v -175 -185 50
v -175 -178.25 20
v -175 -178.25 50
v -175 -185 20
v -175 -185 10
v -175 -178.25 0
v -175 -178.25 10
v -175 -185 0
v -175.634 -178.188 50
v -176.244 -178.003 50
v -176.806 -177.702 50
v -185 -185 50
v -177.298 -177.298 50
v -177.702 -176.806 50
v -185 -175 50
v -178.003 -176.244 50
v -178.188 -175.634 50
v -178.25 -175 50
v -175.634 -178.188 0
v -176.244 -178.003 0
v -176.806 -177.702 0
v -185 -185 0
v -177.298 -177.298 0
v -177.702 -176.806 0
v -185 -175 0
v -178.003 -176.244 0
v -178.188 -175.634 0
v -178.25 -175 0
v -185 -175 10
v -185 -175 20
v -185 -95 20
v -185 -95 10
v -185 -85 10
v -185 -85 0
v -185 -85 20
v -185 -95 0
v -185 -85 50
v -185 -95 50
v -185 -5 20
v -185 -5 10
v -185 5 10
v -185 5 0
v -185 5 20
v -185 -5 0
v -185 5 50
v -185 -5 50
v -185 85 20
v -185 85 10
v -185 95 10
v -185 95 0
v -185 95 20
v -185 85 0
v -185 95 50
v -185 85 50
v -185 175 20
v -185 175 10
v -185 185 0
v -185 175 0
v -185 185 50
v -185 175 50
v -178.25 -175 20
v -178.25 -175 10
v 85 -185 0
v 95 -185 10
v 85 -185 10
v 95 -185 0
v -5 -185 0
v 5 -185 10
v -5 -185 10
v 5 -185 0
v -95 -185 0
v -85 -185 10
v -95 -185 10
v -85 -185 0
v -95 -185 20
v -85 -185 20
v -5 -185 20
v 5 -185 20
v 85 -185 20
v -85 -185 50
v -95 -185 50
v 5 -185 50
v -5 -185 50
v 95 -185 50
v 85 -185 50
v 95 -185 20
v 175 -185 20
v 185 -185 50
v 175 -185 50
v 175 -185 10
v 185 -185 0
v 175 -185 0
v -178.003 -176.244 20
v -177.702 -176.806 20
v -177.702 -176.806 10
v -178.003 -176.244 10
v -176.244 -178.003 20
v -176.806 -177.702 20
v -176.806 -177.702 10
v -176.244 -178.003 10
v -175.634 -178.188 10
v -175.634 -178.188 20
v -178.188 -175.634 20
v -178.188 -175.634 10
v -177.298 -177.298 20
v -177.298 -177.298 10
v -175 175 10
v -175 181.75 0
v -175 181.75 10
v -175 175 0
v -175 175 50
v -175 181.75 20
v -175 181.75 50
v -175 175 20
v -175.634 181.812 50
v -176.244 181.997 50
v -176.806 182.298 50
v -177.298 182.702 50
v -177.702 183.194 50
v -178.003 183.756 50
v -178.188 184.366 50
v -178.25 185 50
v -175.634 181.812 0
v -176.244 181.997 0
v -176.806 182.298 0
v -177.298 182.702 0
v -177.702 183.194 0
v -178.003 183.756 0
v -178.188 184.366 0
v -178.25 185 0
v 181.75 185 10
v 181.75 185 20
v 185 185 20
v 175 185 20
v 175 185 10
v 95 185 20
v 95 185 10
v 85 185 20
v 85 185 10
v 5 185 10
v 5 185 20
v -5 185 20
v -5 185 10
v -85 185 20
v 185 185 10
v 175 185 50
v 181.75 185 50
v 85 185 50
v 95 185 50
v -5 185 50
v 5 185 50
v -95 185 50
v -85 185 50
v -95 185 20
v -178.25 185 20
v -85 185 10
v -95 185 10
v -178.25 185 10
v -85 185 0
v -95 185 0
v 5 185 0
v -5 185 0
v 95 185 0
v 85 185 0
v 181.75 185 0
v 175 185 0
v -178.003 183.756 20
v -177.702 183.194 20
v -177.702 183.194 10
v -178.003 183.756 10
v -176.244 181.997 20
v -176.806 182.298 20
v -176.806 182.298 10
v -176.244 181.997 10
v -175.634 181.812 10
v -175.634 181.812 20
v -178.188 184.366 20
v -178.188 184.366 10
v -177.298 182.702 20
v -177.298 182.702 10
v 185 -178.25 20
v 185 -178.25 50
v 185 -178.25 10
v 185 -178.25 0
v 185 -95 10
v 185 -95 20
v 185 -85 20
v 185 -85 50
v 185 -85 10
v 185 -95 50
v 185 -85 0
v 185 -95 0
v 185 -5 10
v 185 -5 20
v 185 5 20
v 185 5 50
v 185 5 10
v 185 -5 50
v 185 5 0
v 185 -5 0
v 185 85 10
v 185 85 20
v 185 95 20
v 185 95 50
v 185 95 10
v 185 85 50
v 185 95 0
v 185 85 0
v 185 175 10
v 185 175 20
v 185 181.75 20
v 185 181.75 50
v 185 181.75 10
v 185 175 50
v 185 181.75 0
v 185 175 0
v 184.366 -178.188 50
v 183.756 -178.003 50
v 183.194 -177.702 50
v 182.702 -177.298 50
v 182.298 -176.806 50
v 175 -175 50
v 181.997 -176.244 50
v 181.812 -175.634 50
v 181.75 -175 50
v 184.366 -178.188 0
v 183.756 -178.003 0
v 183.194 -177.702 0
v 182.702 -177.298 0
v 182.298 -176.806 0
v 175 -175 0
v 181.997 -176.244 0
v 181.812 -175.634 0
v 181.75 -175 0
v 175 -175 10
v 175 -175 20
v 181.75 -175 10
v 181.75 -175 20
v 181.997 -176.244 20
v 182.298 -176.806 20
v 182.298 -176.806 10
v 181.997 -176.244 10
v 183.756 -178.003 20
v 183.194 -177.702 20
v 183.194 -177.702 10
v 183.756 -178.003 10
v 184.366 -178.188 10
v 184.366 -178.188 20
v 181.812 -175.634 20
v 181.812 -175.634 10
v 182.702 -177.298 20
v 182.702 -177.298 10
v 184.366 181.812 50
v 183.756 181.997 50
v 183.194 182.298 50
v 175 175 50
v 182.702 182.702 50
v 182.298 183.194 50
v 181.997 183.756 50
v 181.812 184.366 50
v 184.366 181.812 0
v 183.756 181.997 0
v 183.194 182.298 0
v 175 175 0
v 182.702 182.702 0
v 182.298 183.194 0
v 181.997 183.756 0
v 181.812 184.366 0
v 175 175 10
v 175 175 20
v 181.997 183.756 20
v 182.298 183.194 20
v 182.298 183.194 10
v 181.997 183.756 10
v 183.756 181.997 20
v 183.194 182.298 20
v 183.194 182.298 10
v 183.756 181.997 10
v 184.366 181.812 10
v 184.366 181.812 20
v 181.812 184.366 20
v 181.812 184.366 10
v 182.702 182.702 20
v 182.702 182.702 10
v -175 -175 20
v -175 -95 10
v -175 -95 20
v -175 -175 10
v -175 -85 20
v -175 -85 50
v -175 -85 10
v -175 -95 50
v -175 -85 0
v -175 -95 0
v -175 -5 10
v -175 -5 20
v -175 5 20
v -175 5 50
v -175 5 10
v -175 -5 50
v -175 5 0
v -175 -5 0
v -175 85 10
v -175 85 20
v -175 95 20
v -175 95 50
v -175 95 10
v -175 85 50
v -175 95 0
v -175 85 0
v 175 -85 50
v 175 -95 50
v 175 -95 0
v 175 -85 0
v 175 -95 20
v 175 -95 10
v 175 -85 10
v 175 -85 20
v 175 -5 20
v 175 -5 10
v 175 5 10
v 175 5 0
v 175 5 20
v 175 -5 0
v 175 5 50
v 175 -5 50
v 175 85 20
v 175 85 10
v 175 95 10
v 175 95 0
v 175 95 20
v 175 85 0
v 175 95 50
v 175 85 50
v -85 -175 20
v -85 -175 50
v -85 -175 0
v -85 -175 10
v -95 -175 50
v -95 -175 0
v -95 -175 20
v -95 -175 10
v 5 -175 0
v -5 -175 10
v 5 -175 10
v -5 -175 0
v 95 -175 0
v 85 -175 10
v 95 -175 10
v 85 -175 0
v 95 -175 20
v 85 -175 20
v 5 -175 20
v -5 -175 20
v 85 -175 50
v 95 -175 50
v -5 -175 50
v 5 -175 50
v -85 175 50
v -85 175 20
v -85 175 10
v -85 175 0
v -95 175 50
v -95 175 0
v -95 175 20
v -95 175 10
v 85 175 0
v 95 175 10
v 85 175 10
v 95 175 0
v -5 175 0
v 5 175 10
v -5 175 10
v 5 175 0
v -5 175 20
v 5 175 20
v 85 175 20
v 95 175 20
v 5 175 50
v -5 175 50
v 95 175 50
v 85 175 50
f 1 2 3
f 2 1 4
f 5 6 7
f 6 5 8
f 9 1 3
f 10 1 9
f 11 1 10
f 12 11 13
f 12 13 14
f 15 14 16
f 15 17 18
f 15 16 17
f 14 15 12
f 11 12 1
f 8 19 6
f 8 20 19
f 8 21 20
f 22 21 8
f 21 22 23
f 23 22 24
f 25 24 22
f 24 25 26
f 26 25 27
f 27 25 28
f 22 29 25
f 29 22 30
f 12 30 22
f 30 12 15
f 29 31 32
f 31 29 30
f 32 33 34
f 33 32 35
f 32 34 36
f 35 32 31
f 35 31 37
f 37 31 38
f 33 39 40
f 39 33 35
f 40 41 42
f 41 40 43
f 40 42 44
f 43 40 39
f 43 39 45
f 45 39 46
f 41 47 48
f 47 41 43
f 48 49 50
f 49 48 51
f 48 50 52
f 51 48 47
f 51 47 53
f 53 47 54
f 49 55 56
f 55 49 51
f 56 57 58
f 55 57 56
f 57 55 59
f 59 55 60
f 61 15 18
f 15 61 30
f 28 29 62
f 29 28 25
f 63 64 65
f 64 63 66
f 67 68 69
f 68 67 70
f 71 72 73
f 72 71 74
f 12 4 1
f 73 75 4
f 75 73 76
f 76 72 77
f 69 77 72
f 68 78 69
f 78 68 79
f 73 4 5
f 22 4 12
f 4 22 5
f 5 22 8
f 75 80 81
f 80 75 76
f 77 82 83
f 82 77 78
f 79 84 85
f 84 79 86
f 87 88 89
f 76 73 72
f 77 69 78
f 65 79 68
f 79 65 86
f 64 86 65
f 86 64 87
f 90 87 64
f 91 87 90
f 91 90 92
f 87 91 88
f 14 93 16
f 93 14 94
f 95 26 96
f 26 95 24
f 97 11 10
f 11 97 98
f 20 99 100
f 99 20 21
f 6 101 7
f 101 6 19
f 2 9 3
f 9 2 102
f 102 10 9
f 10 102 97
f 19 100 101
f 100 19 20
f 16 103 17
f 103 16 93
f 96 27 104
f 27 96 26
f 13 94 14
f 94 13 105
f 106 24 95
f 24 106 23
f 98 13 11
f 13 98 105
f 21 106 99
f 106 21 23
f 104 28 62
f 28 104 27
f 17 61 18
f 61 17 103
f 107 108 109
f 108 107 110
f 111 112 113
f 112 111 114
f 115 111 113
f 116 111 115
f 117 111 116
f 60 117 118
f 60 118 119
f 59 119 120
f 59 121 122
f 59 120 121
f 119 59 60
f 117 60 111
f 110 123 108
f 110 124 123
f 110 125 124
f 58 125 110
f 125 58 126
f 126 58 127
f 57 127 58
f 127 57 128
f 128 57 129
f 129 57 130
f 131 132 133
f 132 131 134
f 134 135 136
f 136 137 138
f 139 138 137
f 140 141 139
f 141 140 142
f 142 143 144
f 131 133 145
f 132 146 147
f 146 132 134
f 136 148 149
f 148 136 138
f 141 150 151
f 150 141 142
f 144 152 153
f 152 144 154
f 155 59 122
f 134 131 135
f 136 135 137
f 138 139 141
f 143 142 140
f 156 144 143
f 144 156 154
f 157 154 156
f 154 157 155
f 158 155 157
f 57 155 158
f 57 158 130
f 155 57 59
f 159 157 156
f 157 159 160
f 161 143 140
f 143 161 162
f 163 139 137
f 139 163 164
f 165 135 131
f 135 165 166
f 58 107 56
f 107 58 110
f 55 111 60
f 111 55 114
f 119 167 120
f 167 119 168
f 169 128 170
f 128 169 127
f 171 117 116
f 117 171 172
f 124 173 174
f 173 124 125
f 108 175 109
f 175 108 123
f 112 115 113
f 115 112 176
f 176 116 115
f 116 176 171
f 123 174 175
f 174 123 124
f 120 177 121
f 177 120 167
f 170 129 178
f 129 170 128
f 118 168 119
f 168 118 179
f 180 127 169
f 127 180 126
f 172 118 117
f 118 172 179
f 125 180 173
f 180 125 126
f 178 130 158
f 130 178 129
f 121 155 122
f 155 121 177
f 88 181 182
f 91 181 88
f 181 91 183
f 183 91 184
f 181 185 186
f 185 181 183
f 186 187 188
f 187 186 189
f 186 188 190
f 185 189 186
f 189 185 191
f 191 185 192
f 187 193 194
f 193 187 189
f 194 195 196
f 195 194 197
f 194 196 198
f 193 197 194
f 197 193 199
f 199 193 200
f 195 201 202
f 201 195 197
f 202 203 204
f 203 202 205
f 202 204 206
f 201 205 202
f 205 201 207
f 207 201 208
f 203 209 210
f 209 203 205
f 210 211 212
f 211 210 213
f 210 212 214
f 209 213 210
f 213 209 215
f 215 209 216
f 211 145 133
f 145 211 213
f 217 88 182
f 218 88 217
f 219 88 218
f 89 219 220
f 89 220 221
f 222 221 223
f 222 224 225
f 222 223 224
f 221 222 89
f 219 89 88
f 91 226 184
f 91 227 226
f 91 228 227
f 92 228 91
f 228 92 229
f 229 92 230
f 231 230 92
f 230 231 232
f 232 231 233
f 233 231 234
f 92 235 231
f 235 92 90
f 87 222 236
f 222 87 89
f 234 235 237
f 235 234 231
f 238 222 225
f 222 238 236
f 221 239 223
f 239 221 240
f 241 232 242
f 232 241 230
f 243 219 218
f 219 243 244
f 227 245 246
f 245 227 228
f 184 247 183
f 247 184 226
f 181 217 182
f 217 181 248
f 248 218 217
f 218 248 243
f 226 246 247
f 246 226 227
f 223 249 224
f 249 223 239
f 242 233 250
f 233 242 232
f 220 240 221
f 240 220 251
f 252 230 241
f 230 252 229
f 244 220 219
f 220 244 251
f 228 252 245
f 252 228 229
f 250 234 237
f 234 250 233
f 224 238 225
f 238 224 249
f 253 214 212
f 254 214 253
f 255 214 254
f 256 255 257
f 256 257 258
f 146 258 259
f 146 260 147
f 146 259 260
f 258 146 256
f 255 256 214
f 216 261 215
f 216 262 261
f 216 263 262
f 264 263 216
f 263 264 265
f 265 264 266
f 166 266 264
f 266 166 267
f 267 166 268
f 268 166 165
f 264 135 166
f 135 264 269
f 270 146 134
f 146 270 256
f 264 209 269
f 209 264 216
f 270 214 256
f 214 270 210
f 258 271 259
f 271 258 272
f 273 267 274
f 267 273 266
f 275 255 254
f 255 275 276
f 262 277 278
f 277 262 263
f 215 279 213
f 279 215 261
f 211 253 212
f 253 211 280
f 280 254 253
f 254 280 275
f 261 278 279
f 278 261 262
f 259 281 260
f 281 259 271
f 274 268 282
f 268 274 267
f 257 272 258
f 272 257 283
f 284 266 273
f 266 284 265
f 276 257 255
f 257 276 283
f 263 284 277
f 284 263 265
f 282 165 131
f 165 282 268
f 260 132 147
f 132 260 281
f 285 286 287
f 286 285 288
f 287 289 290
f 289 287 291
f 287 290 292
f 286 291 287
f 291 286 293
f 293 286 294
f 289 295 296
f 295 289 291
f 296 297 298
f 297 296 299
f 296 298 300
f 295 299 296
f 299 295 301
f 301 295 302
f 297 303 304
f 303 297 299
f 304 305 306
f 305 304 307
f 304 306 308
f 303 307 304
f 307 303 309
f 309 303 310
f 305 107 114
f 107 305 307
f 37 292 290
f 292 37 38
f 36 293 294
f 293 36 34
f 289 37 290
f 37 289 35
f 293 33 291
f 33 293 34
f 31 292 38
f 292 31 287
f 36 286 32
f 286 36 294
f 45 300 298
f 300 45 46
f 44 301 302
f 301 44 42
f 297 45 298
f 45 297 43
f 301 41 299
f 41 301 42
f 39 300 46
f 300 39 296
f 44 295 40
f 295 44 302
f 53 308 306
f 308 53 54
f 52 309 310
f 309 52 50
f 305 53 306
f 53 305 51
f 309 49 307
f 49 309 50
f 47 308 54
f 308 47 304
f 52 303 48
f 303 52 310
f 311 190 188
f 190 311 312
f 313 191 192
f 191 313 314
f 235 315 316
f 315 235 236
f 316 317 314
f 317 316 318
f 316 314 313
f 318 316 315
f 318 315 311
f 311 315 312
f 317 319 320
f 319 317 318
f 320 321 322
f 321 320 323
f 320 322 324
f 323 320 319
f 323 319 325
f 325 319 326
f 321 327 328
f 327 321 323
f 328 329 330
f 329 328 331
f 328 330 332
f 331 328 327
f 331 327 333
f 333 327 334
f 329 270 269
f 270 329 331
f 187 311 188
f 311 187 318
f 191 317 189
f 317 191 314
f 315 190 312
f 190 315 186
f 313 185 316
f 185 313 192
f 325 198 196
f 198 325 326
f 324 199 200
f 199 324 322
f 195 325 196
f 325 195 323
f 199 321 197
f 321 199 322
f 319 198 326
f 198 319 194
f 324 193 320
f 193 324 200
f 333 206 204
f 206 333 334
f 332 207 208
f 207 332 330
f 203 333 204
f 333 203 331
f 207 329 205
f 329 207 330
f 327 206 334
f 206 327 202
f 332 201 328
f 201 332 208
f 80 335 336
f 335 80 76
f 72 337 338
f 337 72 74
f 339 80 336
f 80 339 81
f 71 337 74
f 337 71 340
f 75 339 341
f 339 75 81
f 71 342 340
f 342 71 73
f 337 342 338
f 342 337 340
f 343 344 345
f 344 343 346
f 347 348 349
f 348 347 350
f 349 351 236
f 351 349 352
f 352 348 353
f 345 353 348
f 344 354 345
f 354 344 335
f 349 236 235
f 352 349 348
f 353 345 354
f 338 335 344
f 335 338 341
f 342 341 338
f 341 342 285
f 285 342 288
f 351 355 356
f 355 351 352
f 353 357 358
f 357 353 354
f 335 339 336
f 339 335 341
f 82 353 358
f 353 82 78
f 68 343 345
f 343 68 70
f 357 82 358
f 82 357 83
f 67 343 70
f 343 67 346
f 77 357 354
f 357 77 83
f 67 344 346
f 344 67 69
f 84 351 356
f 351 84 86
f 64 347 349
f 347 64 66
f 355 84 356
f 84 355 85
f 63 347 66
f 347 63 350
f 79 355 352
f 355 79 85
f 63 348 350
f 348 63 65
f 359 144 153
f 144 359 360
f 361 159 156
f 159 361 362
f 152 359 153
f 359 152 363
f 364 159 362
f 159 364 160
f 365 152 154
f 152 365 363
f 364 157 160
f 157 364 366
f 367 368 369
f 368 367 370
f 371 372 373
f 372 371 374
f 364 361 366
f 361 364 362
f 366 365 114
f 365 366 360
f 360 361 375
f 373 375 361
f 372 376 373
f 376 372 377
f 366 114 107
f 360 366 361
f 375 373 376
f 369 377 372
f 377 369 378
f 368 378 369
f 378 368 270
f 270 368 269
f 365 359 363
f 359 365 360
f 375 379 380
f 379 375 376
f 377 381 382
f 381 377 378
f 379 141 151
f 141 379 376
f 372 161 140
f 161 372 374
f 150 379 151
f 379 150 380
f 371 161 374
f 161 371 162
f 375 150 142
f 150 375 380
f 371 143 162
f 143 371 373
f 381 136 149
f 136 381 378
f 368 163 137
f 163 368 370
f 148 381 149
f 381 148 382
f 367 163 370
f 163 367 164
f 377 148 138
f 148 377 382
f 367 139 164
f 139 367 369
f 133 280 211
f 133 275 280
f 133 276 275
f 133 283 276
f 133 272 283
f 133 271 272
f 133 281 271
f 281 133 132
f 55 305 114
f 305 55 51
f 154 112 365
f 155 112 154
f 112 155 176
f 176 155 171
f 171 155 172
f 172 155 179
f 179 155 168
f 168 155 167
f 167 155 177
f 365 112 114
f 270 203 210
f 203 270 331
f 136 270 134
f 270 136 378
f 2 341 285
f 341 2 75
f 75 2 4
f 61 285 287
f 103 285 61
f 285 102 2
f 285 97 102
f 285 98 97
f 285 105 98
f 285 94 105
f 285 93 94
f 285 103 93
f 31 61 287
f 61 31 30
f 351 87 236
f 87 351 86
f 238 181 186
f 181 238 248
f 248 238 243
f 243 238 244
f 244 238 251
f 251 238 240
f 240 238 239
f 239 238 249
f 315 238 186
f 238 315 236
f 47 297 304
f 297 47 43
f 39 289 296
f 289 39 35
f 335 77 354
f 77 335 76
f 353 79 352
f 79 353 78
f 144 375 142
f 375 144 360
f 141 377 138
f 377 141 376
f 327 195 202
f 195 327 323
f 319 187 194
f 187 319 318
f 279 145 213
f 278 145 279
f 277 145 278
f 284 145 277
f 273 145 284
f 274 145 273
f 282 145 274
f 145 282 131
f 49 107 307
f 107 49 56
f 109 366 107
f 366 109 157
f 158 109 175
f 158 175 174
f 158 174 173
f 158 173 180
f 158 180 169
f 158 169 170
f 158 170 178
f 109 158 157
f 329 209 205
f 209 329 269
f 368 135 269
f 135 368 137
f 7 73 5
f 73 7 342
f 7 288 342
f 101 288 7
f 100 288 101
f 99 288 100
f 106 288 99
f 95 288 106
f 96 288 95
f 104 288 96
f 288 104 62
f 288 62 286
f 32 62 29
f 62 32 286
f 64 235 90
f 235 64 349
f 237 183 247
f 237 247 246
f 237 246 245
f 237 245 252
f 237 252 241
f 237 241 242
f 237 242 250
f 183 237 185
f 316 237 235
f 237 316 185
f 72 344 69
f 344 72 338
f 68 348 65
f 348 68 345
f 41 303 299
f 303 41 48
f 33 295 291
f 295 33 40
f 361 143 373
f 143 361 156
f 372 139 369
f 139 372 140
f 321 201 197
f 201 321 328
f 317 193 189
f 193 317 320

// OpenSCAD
positions = [[-180,-180],[-180,-90],[-180,0],[-180,90],[-180,180],[180,-180],[180,-90],[180,0],[180,90],[180,180],[-90,-180],[0,-180],[90,-180],[-90,180],[0,180],[90,180]];
module vert(px,py){
translate([px,py,25])
difference(){
cube([10,10,50],center=true);
if (abs(px)==180 && abs(py)==180){
translate([5,5,0]) cylinder(r=3.25,h=55,$fn=32,center=true);
}
}
}
module hleft(zh){translate([-180,0,zh]) cube([10,370,10],center=true);}
module hright(zh){translate([180,0,zh]) cube([10,370,10],center=true);}
module hfront(zh){translate([0,-180,zh]) cube([370,10,10],center=true);}
module hback(zh){translate([0,180,zh]) cube([370,10,10],center=true);}
for(p=positions){
vert(p[0],p[1]);
}
hleft(15);
hright(15);
hfront(15);
hback(15);
